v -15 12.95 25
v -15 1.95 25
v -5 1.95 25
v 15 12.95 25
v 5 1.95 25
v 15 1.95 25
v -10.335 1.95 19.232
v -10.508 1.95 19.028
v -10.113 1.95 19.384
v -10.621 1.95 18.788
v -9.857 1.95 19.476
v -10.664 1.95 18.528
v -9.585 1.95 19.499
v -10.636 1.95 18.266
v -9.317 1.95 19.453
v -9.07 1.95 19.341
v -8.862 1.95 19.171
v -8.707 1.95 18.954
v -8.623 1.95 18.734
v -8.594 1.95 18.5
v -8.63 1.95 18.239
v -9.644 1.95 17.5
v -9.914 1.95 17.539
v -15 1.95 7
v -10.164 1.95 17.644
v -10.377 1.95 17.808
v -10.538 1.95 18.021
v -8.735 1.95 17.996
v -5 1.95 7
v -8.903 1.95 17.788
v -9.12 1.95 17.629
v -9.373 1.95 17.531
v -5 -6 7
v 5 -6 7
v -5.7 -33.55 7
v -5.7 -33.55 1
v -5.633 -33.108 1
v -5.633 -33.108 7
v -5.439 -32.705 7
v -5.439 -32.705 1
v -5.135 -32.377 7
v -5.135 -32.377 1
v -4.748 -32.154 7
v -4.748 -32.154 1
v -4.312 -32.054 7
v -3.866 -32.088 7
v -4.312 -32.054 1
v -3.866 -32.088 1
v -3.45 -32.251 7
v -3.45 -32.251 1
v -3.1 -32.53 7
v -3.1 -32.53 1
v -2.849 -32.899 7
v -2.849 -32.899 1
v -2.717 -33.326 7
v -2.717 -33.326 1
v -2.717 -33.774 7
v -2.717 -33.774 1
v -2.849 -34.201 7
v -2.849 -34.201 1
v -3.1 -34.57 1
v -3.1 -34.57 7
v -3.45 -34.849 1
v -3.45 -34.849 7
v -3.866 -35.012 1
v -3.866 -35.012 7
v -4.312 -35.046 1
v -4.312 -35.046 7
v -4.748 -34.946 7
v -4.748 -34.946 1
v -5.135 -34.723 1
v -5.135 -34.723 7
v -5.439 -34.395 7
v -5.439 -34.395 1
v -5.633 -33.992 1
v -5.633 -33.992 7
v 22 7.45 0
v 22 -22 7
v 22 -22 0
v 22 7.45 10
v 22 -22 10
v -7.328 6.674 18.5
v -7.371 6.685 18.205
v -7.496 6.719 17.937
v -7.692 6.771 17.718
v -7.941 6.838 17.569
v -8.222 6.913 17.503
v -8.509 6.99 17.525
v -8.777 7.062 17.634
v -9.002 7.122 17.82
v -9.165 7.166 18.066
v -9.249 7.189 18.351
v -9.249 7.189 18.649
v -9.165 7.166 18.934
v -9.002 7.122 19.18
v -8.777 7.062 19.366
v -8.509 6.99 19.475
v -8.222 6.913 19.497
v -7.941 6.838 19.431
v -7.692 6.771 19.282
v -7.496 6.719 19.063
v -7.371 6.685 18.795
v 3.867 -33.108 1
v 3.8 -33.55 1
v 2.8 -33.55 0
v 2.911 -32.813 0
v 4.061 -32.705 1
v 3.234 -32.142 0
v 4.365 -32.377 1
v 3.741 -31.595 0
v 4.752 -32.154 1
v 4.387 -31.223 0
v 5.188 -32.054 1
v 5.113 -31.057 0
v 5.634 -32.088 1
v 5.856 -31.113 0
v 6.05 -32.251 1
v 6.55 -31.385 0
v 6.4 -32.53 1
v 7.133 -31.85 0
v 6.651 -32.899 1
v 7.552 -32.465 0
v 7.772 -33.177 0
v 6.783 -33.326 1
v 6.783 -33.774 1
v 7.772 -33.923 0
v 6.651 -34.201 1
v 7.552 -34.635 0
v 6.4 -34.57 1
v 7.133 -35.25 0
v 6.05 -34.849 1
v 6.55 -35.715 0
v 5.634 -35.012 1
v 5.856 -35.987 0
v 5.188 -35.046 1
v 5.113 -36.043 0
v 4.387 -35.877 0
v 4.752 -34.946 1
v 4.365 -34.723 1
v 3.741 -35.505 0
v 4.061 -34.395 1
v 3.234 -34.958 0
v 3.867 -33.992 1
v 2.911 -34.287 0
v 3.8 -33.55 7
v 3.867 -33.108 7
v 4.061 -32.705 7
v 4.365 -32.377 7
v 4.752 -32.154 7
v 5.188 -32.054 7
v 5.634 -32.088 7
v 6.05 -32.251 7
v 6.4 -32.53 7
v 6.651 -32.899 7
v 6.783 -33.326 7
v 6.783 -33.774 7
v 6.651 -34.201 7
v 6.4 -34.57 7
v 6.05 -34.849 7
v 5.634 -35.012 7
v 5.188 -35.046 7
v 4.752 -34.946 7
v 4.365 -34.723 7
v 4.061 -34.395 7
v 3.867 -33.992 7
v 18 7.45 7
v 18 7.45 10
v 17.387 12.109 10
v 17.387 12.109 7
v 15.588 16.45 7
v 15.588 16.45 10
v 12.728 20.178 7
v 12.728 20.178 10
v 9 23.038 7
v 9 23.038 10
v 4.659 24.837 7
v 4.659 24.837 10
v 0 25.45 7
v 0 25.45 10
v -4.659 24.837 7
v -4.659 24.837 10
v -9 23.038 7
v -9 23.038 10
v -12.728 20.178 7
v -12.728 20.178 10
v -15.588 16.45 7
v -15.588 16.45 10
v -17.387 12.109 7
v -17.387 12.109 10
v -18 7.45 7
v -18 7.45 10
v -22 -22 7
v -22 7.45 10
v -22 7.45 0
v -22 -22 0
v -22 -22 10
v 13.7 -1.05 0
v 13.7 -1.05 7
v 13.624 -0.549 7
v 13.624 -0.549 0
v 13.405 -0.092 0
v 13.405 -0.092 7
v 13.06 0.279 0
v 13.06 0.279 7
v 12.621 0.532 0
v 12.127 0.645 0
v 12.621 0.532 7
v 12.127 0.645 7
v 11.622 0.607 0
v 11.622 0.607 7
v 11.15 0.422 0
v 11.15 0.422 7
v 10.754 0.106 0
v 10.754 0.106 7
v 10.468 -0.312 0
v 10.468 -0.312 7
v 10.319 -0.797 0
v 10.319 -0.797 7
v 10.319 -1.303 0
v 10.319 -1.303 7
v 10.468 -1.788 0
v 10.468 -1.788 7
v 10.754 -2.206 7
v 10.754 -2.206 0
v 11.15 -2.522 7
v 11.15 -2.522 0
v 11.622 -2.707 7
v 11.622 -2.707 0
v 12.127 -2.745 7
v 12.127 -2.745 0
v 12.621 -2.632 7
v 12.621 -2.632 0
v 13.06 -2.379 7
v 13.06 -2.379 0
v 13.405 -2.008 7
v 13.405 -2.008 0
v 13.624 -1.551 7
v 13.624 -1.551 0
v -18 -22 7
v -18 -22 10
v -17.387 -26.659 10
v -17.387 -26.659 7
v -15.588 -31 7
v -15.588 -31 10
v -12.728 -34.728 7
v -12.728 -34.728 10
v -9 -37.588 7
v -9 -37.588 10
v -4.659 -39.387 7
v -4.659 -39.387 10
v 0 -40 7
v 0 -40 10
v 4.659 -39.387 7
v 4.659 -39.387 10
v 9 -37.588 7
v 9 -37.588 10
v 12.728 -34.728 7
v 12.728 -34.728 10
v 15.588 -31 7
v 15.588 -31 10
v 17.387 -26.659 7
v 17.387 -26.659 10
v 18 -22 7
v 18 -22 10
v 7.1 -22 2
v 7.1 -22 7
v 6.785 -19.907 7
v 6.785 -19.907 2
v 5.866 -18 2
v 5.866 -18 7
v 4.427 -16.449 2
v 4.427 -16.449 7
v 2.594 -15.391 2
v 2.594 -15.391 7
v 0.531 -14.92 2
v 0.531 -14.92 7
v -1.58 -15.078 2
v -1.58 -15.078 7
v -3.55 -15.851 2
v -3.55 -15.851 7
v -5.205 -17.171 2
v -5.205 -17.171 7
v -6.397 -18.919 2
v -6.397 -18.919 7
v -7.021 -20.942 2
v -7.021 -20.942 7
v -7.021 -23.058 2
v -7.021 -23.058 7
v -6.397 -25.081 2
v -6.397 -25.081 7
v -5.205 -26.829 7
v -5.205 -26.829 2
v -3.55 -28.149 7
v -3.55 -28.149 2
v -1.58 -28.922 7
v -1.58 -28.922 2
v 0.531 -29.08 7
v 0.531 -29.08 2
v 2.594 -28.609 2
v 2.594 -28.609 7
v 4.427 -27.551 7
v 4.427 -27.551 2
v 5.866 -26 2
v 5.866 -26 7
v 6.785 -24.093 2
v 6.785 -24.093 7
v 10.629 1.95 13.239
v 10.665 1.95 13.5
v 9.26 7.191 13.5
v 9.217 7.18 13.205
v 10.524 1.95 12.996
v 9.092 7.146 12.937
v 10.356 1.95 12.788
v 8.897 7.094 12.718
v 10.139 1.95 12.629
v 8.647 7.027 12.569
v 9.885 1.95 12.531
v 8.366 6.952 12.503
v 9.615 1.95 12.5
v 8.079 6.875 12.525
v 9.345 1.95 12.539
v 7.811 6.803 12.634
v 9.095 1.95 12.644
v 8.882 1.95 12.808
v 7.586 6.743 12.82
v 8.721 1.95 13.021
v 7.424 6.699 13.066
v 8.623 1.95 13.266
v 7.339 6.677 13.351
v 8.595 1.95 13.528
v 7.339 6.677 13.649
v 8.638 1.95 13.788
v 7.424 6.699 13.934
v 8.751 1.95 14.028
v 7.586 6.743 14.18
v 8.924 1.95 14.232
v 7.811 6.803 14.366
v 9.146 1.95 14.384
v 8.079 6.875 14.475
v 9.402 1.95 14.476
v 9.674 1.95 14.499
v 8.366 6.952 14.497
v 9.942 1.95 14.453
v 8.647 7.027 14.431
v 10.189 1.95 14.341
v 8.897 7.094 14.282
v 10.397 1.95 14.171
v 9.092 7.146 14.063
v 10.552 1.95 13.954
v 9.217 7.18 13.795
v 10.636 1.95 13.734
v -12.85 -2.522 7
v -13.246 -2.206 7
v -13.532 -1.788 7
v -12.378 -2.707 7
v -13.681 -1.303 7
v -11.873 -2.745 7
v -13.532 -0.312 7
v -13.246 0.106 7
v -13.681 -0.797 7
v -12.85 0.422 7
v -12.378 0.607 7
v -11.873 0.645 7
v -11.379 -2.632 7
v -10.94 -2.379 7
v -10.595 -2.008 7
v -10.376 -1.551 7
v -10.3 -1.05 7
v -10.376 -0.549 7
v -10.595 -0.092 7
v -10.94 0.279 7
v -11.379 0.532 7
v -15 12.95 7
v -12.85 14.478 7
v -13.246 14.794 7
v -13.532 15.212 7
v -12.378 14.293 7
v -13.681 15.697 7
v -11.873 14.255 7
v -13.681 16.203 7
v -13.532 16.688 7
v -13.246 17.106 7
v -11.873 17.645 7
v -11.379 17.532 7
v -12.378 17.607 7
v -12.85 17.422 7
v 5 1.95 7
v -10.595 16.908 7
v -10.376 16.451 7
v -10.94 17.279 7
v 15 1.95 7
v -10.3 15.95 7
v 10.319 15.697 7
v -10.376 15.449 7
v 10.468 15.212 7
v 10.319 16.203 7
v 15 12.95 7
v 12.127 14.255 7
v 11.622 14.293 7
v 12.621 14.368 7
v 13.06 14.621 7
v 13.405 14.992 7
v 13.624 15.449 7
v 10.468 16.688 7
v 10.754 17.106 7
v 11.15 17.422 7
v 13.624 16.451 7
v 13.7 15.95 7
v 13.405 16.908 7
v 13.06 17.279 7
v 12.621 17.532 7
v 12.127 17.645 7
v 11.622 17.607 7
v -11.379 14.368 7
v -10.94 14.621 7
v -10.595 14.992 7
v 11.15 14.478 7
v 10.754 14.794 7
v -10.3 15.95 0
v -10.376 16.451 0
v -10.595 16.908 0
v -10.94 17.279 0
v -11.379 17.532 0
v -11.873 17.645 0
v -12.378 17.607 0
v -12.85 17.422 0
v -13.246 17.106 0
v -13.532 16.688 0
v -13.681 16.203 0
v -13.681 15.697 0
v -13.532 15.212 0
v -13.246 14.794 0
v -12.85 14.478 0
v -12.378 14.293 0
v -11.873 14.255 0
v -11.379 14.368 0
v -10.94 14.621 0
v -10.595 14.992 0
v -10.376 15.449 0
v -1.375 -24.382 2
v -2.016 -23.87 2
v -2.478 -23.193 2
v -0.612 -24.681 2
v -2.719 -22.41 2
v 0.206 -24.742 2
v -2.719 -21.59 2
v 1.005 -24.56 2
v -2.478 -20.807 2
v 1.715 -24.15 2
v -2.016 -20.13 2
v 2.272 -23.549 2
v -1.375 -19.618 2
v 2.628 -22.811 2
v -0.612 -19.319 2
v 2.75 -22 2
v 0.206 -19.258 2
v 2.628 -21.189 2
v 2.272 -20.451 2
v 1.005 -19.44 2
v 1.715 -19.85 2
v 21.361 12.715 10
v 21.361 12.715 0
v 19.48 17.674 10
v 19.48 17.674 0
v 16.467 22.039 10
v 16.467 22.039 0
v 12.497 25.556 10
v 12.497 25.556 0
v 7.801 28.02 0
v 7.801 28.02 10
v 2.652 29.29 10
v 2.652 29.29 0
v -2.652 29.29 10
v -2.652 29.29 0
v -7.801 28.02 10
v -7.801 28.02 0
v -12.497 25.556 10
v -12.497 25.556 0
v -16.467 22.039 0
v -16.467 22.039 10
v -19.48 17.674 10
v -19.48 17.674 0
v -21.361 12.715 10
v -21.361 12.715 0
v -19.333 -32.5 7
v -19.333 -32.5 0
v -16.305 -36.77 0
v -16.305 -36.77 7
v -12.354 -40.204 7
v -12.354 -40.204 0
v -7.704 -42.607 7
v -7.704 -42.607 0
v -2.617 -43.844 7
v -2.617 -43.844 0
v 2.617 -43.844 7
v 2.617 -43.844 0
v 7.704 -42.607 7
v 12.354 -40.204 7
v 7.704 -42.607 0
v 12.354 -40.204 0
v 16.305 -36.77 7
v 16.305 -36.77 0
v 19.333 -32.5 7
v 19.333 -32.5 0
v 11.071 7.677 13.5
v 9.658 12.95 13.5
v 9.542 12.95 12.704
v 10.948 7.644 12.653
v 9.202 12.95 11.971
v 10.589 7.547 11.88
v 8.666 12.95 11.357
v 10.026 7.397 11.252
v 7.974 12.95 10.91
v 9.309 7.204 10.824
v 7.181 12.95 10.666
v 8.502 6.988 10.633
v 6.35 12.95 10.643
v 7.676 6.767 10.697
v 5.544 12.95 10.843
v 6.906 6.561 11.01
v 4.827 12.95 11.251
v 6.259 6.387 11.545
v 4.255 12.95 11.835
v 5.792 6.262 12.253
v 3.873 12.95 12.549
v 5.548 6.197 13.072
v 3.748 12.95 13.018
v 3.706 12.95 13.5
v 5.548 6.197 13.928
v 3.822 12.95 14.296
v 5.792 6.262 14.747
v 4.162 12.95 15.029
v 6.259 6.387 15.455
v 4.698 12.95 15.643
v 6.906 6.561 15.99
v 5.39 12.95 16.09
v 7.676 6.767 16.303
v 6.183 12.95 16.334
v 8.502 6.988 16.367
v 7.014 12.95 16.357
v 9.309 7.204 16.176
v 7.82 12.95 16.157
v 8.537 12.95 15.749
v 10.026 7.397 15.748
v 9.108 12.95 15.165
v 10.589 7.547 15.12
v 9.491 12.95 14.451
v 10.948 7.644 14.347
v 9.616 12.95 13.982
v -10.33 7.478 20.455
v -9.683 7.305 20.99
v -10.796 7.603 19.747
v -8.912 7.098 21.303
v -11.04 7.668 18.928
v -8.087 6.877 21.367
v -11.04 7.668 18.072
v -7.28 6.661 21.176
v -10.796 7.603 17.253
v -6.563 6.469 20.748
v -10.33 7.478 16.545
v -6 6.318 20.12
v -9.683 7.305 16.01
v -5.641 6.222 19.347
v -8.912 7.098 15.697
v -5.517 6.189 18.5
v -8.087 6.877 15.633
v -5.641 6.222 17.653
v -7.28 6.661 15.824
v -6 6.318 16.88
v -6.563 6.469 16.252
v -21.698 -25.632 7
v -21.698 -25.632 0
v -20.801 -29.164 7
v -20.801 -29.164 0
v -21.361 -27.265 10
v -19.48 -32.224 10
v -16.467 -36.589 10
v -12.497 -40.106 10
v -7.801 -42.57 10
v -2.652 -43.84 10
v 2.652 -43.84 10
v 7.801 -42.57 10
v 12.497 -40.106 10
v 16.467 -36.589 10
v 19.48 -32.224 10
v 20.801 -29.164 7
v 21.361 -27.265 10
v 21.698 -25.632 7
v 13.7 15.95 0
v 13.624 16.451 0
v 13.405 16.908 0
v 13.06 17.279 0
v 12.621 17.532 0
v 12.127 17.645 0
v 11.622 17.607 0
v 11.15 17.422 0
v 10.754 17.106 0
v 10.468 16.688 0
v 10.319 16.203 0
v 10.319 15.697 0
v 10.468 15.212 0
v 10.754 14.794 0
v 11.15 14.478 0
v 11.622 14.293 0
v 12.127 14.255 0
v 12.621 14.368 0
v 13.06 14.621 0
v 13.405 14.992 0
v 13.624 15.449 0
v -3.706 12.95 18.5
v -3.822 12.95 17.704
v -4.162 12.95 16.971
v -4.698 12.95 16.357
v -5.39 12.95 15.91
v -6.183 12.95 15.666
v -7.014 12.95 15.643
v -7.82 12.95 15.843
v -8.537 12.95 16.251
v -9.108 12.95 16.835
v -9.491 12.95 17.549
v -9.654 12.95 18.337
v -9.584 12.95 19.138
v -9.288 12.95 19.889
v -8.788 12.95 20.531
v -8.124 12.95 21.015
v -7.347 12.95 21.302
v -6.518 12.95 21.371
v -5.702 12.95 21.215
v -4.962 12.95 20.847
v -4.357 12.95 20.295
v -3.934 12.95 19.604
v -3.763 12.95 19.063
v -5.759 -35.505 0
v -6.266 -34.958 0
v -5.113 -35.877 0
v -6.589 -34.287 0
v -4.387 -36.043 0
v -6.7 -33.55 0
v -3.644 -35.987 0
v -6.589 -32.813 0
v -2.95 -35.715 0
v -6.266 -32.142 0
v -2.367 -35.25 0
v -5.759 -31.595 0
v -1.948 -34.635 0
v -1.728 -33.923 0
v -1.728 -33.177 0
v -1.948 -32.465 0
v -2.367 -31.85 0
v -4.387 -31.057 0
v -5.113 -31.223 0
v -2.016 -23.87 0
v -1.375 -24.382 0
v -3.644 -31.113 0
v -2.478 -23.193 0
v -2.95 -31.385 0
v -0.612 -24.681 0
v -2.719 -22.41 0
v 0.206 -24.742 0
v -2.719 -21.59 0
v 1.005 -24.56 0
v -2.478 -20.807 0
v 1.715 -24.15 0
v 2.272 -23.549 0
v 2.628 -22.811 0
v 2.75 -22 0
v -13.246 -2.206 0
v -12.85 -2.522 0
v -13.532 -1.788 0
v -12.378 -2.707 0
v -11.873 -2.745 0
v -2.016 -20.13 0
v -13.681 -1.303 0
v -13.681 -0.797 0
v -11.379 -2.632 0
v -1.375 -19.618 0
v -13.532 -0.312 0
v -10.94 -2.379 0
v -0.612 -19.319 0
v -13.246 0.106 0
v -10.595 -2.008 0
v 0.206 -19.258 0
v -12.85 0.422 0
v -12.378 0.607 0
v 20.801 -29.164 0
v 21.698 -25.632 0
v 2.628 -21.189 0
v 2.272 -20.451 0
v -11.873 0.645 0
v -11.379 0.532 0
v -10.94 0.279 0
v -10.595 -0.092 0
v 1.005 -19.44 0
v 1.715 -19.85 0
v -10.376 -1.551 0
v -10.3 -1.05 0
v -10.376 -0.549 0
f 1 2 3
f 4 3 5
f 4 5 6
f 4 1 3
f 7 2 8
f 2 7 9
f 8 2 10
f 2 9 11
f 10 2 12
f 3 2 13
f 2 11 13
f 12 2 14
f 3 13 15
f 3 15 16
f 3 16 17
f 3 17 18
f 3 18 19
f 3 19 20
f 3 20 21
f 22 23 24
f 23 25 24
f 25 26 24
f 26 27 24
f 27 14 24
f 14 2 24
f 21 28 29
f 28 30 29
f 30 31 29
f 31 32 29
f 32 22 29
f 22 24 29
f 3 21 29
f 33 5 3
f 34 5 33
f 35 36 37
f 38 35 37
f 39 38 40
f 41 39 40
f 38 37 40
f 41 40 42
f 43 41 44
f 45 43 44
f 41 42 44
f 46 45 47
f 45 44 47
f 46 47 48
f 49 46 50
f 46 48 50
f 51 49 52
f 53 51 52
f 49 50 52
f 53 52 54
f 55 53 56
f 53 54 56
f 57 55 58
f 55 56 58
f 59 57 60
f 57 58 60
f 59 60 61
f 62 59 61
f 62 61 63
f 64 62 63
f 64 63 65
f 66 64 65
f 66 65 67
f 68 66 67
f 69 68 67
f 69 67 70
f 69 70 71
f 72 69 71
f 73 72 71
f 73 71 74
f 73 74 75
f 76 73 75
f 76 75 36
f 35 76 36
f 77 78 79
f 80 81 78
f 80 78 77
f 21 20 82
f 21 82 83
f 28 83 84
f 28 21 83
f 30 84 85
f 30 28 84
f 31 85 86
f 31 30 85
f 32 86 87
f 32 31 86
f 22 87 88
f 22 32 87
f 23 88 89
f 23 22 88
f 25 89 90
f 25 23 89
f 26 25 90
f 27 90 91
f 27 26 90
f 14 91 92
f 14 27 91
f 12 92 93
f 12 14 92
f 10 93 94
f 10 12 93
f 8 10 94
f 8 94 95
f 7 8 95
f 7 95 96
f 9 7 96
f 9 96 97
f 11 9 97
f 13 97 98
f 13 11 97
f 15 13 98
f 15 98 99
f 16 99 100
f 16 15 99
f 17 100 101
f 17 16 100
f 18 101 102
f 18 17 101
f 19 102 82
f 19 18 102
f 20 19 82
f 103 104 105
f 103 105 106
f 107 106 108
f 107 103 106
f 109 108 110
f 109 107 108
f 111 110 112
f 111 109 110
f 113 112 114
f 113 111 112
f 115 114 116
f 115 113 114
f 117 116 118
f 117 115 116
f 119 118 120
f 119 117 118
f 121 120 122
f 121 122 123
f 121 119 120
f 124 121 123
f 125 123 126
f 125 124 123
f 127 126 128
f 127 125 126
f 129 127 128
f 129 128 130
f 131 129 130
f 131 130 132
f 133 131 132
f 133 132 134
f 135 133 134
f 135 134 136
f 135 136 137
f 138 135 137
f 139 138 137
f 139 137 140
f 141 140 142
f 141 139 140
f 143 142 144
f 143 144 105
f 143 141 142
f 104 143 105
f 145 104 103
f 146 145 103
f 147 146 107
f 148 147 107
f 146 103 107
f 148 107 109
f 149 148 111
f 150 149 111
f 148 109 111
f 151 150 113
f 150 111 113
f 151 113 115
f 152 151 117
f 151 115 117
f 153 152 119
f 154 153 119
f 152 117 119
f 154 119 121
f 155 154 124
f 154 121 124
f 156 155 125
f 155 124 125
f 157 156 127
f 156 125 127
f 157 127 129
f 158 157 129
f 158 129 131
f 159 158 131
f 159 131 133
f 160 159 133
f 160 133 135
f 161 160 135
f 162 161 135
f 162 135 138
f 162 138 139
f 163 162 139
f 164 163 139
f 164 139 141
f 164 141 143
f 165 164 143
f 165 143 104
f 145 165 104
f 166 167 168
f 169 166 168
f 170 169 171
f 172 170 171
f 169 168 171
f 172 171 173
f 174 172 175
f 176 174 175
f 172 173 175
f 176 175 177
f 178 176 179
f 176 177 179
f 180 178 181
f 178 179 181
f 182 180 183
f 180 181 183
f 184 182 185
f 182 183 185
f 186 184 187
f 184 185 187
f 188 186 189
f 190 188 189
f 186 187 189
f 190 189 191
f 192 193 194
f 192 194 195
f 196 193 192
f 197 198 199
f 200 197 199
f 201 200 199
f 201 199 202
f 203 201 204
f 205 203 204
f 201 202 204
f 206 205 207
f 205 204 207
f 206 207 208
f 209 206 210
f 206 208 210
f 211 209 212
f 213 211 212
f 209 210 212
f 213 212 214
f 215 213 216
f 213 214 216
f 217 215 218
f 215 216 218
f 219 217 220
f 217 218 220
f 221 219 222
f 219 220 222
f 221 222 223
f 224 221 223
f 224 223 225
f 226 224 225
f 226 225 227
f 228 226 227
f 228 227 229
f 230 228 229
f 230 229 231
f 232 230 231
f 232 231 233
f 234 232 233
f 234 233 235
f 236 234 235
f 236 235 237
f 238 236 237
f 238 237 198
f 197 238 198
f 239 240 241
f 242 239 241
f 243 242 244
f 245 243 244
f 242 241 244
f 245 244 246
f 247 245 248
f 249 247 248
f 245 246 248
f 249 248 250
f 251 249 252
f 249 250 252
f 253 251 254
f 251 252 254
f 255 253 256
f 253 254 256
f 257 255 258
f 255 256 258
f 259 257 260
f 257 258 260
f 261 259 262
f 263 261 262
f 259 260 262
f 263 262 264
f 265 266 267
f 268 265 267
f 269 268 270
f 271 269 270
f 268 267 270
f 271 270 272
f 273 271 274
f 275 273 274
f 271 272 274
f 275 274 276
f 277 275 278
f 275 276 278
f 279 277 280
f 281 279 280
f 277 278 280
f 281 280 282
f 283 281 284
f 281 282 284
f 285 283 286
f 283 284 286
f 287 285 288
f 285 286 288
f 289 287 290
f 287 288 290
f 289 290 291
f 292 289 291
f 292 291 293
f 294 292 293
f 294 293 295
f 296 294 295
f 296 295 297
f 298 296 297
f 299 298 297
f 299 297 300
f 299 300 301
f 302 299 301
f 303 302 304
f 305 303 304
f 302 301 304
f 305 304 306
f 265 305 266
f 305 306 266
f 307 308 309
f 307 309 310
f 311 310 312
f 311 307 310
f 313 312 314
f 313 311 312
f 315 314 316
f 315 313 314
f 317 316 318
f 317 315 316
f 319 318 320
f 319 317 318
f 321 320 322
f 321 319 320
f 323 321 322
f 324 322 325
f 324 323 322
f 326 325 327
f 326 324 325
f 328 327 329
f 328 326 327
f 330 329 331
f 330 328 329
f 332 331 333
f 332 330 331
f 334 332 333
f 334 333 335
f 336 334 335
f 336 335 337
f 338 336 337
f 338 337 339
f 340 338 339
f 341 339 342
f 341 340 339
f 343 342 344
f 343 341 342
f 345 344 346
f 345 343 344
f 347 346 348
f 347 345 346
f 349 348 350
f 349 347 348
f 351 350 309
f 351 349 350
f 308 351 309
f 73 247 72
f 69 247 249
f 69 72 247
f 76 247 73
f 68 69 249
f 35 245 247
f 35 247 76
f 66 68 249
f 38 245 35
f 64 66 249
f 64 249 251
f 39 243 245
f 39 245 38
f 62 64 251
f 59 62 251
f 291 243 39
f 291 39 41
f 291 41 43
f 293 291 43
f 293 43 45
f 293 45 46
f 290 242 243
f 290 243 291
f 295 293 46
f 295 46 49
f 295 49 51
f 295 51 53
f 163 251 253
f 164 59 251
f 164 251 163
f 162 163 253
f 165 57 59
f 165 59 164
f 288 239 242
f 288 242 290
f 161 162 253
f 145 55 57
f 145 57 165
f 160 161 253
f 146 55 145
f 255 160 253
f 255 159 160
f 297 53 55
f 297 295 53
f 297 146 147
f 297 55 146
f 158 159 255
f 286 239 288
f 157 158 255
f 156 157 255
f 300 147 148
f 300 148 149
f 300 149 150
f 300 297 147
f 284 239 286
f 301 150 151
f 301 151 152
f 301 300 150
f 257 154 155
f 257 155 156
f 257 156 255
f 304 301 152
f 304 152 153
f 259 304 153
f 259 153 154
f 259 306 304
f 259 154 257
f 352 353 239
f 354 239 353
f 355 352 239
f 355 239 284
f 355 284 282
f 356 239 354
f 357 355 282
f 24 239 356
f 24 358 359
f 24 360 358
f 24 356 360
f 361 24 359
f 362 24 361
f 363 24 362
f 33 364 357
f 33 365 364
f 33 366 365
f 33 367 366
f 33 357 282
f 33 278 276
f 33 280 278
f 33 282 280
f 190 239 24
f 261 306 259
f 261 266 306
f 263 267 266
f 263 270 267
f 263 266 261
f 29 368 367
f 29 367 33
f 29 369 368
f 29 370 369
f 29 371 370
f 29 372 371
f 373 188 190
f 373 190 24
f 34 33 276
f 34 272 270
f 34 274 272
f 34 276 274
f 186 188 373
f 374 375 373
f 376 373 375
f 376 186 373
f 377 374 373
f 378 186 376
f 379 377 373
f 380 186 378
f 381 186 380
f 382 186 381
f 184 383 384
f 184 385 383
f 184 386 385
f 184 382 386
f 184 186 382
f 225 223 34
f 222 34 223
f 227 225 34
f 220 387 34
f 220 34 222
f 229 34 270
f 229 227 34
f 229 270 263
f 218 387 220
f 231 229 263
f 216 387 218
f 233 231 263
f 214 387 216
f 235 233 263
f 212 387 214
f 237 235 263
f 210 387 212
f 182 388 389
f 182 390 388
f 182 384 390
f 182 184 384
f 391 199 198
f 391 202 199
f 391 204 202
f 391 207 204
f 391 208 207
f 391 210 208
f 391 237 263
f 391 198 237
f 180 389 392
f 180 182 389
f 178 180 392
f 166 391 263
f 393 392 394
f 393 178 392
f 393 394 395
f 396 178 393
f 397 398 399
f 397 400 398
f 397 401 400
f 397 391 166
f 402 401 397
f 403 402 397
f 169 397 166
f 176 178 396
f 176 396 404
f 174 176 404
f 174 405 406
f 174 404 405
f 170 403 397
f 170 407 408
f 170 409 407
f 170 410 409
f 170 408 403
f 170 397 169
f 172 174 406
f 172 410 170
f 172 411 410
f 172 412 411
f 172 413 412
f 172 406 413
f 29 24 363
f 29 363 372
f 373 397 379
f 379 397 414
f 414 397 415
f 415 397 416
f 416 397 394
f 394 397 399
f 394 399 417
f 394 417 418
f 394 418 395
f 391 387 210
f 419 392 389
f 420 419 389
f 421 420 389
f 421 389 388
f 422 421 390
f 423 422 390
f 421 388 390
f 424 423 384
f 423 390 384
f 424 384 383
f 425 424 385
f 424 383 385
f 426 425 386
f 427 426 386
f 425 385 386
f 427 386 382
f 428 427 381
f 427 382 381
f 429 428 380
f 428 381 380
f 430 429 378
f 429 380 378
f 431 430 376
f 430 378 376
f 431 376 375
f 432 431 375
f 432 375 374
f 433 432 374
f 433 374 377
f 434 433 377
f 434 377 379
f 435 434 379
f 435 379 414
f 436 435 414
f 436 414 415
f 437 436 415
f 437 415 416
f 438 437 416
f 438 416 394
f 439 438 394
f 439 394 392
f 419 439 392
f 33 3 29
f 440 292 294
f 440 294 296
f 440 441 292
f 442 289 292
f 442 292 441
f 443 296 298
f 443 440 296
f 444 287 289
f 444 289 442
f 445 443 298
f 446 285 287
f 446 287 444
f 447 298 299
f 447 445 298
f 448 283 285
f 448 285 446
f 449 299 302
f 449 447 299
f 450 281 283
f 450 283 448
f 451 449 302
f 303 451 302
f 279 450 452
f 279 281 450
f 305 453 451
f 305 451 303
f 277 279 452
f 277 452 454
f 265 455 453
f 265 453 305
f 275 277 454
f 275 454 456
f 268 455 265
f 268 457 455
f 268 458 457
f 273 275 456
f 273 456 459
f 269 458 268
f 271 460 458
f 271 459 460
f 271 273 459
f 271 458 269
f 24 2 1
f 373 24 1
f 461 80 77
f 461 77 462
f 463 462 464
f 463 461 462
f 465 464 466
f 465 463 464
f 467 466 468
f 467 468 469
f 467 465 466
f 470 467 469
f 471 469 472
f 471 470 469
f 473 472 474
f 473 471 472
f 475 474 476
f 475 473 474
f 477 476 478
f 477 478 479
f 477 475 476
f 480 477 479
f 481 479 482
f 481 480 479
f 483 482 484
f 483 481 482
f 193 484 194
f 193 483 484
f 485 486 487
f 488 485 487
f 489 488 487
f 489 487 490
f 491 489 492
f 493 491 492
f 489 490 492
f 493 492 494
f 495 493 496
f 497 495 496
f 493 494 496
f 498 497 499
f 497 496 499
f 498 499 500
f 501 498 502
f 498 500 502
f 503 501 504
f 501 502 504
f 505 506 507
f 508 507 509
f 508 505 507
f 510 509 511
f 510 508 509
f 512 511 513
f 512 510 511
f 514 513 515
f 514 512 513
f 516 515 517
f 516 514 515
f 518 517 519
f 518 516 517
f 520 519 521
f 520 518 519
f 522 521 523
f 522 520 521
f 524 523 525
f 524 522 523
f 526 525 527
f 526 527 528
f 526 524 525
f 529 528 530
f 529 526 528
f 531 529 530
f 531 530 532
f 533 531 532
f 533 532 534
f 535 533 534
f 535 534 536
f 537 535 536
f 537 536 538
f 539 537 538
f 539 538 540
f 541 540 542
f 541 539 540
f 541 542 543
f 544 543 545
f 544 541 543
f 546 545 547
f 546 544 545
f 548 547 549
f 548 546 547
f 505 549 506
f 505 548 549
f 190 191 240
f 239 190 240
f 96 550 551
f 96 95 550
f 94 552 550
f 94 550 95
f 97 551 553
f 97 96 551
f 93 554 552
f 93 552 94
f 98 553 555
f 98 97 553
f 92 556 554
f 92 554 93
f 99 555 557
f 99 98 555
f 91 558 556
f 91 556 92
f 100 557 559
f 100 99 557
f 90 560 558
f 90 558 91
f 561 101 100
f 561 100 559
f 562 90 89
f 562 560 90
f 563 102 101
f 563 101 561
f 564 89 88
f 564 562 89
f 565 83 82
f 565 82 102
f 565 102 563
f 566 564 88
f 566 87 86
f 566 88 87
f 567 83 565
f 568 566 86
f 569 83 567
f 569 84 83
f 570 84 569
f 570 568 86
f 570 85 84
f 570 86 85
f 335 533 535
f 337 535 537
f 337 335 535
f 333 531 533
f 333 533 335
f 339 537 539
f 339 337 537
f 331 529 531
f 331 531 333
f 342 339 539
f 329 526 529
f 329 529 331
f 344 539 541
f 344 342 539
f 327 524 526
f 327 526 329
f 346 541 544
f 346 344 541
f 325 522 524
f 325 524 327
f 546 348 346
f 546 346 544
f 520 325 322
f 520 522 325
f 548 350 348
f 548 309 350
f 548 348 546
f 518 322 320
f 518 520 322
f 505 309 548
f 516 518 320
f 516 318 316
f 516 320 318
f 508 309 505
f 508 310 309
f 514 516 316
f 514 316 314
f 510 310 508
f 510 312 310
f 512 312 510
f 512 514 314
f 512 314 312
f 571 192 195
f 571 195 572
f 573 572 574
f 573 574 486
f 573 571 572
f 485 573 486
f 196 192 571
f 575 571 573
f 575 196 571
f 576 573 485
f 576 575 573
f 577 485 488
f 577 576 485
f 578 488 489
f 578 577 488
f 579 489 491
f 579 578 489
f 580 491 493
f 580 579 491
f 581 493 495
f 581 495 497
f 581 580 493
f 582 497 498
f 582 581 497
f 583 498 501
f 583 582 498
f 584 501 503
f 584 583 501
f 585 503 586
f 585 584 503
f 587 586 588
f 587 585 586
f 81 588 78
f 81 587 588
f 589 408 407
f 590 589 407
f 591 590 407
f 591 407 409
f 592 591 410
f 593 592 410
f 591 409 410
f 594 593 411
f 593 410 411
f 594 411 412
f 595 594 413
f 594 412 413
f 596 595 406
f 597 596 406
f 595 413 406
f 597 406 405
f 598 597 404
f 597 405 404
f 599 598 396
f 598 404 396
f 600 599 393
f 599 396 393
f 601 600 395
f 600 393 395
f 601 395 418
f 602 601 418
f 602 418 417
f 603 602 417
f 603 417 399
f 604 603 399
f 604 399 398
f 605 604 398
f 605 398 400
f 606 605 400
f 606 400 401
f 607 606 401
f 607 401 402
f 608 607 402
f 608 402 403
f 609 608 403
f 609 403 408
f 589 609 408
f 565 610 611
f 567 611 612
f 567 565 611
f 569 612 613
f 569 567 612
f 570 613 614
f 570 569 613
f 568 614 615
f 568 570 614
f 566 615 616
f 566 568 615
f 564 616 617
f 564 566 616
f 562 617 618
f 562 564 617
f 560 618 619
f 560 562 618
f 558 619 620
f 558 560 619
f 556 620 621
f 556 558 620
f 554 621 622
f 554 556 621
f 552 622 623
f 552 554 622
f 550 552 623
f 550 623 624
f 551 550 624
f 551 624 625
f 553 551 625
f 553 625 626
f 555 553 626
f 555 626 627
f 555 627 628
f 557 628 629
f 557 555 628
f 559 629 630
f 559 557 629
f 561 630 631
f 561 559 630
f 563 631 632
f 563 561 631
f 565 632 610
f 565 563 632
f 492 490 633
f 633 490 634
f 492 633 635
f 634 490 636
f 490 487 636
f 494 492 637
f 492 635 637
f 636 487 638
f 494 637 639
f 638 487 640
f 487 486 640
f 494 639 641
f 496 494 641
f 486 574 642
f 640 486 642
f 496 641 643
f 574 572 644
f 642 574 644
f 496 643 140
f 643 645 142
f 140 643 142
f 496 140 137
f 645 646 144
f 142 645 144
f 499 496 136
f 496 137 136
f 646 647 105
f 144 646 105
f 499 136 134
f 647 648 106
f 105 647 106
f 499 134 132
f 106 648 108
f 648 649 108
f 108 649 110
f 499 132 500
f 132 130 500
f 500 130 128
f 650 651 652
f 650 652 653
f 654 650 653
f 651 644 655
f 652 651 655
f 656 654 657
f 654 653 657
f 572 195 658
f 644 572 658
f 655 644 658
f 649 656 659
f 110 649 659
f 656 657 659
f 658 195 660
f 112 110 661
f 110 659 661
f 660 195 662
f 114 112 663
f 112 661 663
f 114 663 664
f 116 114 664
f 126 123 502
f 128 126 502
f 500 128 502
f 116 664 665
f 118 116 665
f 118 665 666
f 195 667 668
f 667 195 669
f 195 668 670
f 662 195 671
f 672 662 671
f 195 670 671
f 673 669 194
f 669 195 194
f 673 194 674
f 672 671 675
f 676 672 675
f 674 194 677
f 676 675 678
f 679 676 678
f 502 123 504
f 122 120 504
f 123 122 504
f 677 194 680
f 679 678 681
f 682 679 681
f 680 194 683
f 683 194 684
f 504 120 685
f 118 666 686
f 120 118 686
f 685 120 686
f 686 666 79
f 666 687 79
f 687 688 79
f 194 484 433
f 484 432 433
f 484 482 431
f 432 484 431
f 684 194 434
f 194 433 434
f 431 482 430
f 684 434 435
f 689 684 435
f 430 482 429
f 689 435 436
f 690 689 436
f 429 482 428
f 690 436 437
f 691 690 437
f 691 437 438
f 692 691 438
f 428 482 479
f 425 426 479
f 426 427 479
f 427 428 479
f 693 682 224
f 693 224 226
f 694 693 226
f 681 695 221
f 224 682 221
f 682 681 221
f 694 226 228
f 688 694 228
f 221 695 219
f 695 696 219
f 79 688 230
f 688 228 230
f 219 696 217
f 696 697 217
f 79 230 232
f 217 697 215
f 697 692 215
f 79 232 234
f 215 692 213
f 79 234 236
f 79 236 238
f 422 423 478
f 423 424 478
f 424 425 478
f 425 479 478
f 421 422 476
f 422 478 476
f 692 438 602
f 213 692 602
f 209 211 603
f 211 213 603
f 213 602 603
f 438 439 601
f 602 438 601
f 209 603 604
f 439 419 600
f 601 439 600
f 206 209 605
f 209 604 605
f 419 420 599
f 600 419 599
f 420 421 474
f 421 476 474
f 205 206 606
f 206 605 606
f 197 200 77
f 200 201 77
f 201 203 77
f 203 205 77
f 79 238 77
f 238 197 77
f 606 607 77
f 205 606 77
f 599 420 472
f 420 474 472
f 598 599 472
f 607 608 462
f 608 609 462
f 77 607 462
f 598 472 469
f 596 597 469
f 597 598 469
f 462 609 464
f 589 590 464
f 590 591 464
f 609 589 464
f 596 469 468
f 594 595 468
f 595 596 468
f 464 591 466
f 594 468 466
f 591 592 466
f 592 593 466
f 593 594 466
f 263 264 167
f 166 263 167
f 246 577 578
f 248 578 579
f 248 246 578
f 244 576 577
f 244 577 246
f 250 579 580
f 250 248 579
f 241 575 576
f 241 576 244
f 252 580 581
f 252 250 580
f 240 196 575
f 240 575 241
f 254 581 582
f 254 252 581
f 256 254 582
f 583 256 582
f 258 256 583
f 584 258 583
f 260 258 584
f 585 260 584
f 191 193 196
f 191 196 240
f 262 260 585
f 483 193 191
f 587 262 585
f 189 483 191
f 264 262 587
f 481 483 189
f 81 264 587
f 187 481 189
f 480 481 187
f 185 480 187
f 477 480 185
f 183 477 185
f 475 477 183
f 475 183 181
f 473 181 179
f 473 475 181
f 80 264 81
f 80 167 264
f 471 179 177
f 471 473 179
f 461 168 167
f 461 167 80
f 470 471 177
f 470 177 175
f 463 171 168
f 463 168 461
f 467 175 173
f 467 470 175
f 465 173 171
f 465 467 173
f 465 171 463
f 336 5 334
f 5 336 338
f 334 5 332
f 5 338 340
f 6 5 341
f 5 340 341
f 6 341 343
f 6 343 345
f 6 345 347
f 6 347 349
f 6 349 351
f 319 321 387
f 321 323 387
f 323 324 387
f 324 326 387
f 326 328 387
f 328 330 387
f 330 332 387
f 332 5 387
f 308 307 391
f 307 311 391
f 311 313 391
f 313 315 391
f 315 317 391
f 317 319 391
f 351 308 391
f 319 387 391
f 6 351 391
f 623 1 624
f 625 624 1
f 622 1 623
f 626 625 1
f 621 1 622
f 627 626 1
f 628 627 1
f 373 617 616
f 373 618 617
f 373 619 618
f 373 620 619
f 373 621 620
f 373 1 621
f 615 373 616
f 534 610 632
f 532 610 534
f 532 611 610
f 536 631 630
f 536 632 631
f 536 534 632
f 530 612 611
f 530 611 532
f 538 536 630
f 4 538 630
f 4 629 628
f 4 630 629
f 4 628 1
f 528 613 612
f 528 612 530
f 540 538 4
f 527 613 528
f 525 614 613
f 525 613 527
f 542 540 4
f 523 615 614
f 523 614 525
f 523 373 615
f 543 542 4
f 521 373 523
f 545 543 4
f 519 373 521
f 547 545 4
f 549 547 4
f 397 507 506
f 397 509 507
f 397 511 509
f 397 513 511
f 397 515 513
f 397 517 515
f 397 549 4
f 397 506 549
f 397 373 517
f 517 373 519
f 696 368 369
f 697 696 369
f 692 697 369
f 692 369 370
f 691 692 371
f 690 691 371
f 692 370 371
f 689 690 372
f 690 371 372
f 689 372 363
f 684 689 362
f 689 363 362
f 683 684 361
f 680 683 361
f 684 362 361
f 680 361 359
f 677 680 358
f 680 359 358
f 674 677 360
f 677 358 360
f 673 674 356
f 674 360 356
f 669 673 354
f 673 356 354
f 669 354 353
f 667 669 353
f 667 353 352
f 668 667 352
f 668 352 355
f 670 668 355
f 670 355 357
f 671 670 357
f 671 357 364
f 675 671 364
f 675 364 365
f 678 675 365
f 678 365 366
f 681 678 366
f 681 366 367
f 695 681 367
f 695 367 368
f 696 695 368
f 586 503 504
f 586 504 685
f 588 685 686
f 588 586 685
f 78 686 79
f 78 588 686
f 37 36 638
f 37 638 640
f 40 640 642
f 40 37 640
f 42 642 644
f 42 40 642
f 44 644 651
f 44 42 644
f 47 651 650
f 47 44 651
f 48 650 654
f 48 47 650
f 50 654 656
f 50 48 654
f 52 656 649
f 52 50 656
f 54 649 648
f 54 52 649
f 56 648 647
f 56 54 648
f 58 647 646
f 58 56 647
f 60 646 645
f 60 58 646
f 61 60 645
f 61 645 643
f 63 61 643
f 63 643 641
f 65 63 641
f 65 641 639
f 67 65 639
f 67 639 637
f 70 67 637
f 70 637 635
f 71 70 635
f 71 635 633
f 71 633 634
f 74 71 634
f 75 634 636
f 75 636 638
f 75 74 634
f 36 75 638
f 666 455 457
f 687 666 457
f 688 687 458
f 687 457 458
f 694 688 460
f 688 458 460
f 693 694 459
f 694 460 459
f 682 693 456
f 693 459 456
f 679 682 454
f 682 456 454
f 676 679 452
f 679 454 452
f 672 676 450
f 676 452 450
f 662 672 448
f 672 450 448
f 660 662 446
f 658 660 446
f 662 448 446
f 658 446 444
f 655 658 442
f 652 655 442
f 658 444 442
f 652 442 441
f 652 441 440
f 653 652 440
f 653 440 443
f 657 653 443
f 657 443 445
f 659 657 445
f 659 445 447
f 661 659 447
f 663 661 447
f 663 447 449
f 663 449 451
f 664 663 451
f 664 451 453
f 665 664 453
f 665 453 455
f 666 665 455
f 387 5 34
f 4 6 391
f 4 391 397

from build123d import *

# Parameters (mm, degrees)
BOSS_EXTRUDE1_DEPTH = 7
SKETCH2_R           = 2.75
CUT_EXTRUDE1_DEPTH  = 56.14752941
SKETCH3_R           = 7.1
CUT_EXTRUDE2_DEPTH  = 5
CUT_EXTRUDE3_REACH  = 57.148
SKETCH6_R           = 1.7
SKETCH9_W           = 30
SKETCH9_H           = 11
BOSS_EXTRUDE2_DEPTH = 18
SKETCH12_R          = 1.5
CUT_EXTRUDE5_DEPTH  = 61.143578211
CHAMFER2_SIZE       = 1
BOSS_EXTRUDE3_DEPTH = 5
CUT_EXTRUDE6_DEPTH  = 58.586890869
BOSS_EXTRUDE4_START = 3
BOSS_EXTRUDE4_DEPTH = 3


with BuildPart() as part:
    # Sketch1 → Boss-Extrude1 (new body)
    with BuildSketch(Plane.XY):
        with BuildLine():
            Line((-28.559544782, -15.511363636), (-19.332614929, -32.5))
            ThreePointArc((-19.332614929, -32.5), (0, -44), (19.332614929, -32.5))
            Line((19.332614929, -32.5), (28.559544782, -15.511363636))
            ThreePointArc((28.559544782, -15.511363636), (0, 32.5), (-28.559544782, -15.511363636))
        make_face()
    extrude(amount=BOSS_EXTRUDE1_DEPTH)

    # Sketch2 → Cut-Extrude1 (cut, through all)
    with BuildSketch(Plane.XY.offset(7)):
        with Locations((0, -22)):
            Circle(SKETCH2_R)
    extrude(amount=-CUT_EXTRUDE1_DEPTH, mode=Mode.SUBTRACT)

    # Sketch3 → Cut-Extrude2 (cut)
    with BuildSketch(Plane.XY.offset(7)):
        with Locations((0, -22)):
            Circle(SKETCH3_R)
    extrude(amount=-CUT_EXTRUDE2_DEPTH, mode=Mode.SUBTRACT)

    # Sketch6 → Cut-Extrude3 (cut, up to next)
    with BuildSketch(Plane.XY.offset(7), mode=Mode.PRIVATE) as cut_extrude3_sk1:
        with Locations((-12, 15.95)):
            Circle(SKETCH6_R)
    cut_extrude3_tool1 = extrude(cut_extrude3_sk1.sketch, amount=-CUT_EXTRUDE3_REACH, mode=Mode.PRIVATE) & part.part
    # Sketch6 → Cut-Extrude3 (cut, up to next)
    with BuildSketch(Plane.XY.offset(7), mode=Mode.PRIVATE) as cut_extrude3_sk2:
        with Locations((12, 15.95)):
            Circle(SKETCH6_R)
    cut_extrude3_tool2 = extrude(cut_extrude3_sk2.sketch, amount=-CUT_EXTRUDE3_REACH, mode=Mode.PRIVATE) & part.part
    # Sketch6 → Cut-Extrude3 (cut, up to next)
    with BuildSketch(Plane.XY.offset(7), mode=Mode.PRIVATE) as cut_extrude3_sk3:
        with Locations((-12, -1.05)):
            Circle(SKETCH6_R)
    cut_extrude3_tool3 = extrude(cut_extrude3_sk3.sketch, amount=-CUT_EXTRUDE3_REACH, mode=Mode.PRIVATE) & part.part
    # Sketch6 → Cut-Extrude3 (cut, up to next)
    with BuildSketch(Plane.XY.offset(7), mode=Mode.PRIVATE) as cut_extrude3_sk4:
        with Locations((12, -1.05)):
            Circle(SKETCH6_R)
    cut_extrude3_tool4 = extrude(cut_extrude3_sk4.sketch, amount=-CUT_EXTRUDE3_REACH, mode=Mode.PRIVATE) & part.part
    add(cut_extrude3_tool1.solids().sort_by_distance((-12, 15.95, 7))[0], mode=Mode.SUBTRACT)
    add(cut_extrude3_tool2.solids().sort_by_distance((12, 15.95, 7))[0], mode=Mode.SUBTRACT)
    add(cut_extrude3_tool3.solids().sort_by_distance((-12, -1.05, 7))[0], mode=Mode.SUBTRACT)
    add(cut_extrude3_tool4.solids().sort_by_distance((12, -1.05, 7))[0], mode=Mode.SUBTRACT)

    # Sketch9 → Boss-Extrude2 (add)
    with BuildSketch(Plane.XY.offset(7)):
        with Locations((0, 7.45)):
            Rectangle(SKETCH9_W, SKETCH9_H)
    extrude(amount=BOSS_EXTRUDE2_DEPTH)

    # Sketch10 → Cut-Revolve1 (revolve, cut)
    with BuildSketch(Plane.XY.offset(18.5)):
        Polygon((-10.364859929, -0.79478264), (-6.482574253, 13.694104755), (-9.259611003, 14.438209509), (-11.071344319, 7.676728725), (-9.260233395, 7.191443016), (-11.330785756, -0.535963595), align=None)
    revolve(axis=Axis((-10.364859929, -0.79478264, 18.5), (0.25881904510252135, 0.9659258262890681, 0)), mode=Mode.SUBTRACT)

    # Sketch11 → Cut-Revolve2 (revolve, cut)
    with BuildSketch(Plane.XY.offset(13.5)):
        Polygon((10.364859929, -0.79478264), (6.482574253, 13.694104755), (3.705537502, 12.95), (5.517270818, 6.188519216), (7.328381742, 6.673804926), (9.398934103, -1.053601685), align=None)
    revolve(axis=Axis((10.364859929, -0.79478264, 13.5), (-0.258819045102522, 0.965925826289068, 0)), mode=Mode.SUBTRACT)

    # Sketch12 → Cut-Extrude5 (cut, through all)
    with BuildSketch(Plane(origin=(0, 0, 0), x_dir=(-1, 0, 0), z_dir=(0, 0, -1))):
        with Locations((-5.3, -33.55)):
            Circle(SKETCH12_R)
        with Locations((4.2, -33.55)):
            Circle(SKETCH12_R)
    extrude(amount=-CUT_EXTRUDE5_DEPTH, mode=Mode.SUBTRACT)

    # Chamfer2
    chamfer2_edges = [part.edges().sort_by_distance(p)[0] for p in [
        (-2.7, -33.55, 0),
        (6.8, -33.55, 0),
    ]]
    chamfer(chamfer2_edges, length=CHAMFER2_SIZE)

    # Sketch13 → Boss-Extrude3 (add, symmetric)
    with BuildSketch(Plane(origin=(0, 0, 0), x_dir=(0, 0, -1), z_dir=(1, 0, 0))):
        Polygon((-25, 1.95), (-7, -6), (-7, 1.95), align=None)
    extrude(amount=BOSS_EXTRUDE3_DEPTH, both=True)

    # Sketch14 → Cut-Extrude6 (cut, through all)
    with BuildSketch(Plane.XY.offset(7)):
        with BuildLine():
            Line((-22, 7.45), (-22, -22))
            ThreePointArc((-22, -22), (-21.322728817, -27.416755097), (-19.332614929, -32.5))
            Line((-19.332614929, -32.5), (-28.559544782, -15.511363636))
            ThreePointArc((-28.559544782, -15.511363636), (0, 32.5), (28.559544782, -15.511363636))
            Line((28.559544782, -15.511363636), (19.332614929, -32.5))
            ThreePointArc((19.332614929, -32.5), (21.322728817, -27.416755097), (22, -22))
            Line((22, -22), (22, 7.45))
            ThreePointArc((22, 7.45), (0, 29.45), (-22, 7.45))
        make_face()
    extrude(amount=-CUT_EXTRUDE6_DEPTH, mode=Mode.SUBTRACT)

    # Sketch15 → Boss-Extrude4 (add)
    with BuildSketch(Plane.XY.offset(7).offset(BOSS_EXTRUDE4_START)):
        with BuildLine():
            Line((-22, 7.45), (-22, -22))
            ThreePointArc((-22, -22), (0, -44), (22, -22))
            Line((22, -22), (22, 7.45))
            ThreePointArc((22, 7.45), (0, 29.45), (-22, 7.45))
        make_face()
        with BuildLine():
            Line((-18, 7.45), (-18, -22))
            ThreePointArc((-18, -22), (0, -40), (18, -22))
            Line((18, -22), (18, 7.45))
            ThreePointArc((18, 7.45), (0, 25.45), (-18, 7.45))
        make_face(mode=Mode.SUBTRACT)
    extrude(amount=-BOSS_EXTRUDE4_DEPTH)


solid = part.part
